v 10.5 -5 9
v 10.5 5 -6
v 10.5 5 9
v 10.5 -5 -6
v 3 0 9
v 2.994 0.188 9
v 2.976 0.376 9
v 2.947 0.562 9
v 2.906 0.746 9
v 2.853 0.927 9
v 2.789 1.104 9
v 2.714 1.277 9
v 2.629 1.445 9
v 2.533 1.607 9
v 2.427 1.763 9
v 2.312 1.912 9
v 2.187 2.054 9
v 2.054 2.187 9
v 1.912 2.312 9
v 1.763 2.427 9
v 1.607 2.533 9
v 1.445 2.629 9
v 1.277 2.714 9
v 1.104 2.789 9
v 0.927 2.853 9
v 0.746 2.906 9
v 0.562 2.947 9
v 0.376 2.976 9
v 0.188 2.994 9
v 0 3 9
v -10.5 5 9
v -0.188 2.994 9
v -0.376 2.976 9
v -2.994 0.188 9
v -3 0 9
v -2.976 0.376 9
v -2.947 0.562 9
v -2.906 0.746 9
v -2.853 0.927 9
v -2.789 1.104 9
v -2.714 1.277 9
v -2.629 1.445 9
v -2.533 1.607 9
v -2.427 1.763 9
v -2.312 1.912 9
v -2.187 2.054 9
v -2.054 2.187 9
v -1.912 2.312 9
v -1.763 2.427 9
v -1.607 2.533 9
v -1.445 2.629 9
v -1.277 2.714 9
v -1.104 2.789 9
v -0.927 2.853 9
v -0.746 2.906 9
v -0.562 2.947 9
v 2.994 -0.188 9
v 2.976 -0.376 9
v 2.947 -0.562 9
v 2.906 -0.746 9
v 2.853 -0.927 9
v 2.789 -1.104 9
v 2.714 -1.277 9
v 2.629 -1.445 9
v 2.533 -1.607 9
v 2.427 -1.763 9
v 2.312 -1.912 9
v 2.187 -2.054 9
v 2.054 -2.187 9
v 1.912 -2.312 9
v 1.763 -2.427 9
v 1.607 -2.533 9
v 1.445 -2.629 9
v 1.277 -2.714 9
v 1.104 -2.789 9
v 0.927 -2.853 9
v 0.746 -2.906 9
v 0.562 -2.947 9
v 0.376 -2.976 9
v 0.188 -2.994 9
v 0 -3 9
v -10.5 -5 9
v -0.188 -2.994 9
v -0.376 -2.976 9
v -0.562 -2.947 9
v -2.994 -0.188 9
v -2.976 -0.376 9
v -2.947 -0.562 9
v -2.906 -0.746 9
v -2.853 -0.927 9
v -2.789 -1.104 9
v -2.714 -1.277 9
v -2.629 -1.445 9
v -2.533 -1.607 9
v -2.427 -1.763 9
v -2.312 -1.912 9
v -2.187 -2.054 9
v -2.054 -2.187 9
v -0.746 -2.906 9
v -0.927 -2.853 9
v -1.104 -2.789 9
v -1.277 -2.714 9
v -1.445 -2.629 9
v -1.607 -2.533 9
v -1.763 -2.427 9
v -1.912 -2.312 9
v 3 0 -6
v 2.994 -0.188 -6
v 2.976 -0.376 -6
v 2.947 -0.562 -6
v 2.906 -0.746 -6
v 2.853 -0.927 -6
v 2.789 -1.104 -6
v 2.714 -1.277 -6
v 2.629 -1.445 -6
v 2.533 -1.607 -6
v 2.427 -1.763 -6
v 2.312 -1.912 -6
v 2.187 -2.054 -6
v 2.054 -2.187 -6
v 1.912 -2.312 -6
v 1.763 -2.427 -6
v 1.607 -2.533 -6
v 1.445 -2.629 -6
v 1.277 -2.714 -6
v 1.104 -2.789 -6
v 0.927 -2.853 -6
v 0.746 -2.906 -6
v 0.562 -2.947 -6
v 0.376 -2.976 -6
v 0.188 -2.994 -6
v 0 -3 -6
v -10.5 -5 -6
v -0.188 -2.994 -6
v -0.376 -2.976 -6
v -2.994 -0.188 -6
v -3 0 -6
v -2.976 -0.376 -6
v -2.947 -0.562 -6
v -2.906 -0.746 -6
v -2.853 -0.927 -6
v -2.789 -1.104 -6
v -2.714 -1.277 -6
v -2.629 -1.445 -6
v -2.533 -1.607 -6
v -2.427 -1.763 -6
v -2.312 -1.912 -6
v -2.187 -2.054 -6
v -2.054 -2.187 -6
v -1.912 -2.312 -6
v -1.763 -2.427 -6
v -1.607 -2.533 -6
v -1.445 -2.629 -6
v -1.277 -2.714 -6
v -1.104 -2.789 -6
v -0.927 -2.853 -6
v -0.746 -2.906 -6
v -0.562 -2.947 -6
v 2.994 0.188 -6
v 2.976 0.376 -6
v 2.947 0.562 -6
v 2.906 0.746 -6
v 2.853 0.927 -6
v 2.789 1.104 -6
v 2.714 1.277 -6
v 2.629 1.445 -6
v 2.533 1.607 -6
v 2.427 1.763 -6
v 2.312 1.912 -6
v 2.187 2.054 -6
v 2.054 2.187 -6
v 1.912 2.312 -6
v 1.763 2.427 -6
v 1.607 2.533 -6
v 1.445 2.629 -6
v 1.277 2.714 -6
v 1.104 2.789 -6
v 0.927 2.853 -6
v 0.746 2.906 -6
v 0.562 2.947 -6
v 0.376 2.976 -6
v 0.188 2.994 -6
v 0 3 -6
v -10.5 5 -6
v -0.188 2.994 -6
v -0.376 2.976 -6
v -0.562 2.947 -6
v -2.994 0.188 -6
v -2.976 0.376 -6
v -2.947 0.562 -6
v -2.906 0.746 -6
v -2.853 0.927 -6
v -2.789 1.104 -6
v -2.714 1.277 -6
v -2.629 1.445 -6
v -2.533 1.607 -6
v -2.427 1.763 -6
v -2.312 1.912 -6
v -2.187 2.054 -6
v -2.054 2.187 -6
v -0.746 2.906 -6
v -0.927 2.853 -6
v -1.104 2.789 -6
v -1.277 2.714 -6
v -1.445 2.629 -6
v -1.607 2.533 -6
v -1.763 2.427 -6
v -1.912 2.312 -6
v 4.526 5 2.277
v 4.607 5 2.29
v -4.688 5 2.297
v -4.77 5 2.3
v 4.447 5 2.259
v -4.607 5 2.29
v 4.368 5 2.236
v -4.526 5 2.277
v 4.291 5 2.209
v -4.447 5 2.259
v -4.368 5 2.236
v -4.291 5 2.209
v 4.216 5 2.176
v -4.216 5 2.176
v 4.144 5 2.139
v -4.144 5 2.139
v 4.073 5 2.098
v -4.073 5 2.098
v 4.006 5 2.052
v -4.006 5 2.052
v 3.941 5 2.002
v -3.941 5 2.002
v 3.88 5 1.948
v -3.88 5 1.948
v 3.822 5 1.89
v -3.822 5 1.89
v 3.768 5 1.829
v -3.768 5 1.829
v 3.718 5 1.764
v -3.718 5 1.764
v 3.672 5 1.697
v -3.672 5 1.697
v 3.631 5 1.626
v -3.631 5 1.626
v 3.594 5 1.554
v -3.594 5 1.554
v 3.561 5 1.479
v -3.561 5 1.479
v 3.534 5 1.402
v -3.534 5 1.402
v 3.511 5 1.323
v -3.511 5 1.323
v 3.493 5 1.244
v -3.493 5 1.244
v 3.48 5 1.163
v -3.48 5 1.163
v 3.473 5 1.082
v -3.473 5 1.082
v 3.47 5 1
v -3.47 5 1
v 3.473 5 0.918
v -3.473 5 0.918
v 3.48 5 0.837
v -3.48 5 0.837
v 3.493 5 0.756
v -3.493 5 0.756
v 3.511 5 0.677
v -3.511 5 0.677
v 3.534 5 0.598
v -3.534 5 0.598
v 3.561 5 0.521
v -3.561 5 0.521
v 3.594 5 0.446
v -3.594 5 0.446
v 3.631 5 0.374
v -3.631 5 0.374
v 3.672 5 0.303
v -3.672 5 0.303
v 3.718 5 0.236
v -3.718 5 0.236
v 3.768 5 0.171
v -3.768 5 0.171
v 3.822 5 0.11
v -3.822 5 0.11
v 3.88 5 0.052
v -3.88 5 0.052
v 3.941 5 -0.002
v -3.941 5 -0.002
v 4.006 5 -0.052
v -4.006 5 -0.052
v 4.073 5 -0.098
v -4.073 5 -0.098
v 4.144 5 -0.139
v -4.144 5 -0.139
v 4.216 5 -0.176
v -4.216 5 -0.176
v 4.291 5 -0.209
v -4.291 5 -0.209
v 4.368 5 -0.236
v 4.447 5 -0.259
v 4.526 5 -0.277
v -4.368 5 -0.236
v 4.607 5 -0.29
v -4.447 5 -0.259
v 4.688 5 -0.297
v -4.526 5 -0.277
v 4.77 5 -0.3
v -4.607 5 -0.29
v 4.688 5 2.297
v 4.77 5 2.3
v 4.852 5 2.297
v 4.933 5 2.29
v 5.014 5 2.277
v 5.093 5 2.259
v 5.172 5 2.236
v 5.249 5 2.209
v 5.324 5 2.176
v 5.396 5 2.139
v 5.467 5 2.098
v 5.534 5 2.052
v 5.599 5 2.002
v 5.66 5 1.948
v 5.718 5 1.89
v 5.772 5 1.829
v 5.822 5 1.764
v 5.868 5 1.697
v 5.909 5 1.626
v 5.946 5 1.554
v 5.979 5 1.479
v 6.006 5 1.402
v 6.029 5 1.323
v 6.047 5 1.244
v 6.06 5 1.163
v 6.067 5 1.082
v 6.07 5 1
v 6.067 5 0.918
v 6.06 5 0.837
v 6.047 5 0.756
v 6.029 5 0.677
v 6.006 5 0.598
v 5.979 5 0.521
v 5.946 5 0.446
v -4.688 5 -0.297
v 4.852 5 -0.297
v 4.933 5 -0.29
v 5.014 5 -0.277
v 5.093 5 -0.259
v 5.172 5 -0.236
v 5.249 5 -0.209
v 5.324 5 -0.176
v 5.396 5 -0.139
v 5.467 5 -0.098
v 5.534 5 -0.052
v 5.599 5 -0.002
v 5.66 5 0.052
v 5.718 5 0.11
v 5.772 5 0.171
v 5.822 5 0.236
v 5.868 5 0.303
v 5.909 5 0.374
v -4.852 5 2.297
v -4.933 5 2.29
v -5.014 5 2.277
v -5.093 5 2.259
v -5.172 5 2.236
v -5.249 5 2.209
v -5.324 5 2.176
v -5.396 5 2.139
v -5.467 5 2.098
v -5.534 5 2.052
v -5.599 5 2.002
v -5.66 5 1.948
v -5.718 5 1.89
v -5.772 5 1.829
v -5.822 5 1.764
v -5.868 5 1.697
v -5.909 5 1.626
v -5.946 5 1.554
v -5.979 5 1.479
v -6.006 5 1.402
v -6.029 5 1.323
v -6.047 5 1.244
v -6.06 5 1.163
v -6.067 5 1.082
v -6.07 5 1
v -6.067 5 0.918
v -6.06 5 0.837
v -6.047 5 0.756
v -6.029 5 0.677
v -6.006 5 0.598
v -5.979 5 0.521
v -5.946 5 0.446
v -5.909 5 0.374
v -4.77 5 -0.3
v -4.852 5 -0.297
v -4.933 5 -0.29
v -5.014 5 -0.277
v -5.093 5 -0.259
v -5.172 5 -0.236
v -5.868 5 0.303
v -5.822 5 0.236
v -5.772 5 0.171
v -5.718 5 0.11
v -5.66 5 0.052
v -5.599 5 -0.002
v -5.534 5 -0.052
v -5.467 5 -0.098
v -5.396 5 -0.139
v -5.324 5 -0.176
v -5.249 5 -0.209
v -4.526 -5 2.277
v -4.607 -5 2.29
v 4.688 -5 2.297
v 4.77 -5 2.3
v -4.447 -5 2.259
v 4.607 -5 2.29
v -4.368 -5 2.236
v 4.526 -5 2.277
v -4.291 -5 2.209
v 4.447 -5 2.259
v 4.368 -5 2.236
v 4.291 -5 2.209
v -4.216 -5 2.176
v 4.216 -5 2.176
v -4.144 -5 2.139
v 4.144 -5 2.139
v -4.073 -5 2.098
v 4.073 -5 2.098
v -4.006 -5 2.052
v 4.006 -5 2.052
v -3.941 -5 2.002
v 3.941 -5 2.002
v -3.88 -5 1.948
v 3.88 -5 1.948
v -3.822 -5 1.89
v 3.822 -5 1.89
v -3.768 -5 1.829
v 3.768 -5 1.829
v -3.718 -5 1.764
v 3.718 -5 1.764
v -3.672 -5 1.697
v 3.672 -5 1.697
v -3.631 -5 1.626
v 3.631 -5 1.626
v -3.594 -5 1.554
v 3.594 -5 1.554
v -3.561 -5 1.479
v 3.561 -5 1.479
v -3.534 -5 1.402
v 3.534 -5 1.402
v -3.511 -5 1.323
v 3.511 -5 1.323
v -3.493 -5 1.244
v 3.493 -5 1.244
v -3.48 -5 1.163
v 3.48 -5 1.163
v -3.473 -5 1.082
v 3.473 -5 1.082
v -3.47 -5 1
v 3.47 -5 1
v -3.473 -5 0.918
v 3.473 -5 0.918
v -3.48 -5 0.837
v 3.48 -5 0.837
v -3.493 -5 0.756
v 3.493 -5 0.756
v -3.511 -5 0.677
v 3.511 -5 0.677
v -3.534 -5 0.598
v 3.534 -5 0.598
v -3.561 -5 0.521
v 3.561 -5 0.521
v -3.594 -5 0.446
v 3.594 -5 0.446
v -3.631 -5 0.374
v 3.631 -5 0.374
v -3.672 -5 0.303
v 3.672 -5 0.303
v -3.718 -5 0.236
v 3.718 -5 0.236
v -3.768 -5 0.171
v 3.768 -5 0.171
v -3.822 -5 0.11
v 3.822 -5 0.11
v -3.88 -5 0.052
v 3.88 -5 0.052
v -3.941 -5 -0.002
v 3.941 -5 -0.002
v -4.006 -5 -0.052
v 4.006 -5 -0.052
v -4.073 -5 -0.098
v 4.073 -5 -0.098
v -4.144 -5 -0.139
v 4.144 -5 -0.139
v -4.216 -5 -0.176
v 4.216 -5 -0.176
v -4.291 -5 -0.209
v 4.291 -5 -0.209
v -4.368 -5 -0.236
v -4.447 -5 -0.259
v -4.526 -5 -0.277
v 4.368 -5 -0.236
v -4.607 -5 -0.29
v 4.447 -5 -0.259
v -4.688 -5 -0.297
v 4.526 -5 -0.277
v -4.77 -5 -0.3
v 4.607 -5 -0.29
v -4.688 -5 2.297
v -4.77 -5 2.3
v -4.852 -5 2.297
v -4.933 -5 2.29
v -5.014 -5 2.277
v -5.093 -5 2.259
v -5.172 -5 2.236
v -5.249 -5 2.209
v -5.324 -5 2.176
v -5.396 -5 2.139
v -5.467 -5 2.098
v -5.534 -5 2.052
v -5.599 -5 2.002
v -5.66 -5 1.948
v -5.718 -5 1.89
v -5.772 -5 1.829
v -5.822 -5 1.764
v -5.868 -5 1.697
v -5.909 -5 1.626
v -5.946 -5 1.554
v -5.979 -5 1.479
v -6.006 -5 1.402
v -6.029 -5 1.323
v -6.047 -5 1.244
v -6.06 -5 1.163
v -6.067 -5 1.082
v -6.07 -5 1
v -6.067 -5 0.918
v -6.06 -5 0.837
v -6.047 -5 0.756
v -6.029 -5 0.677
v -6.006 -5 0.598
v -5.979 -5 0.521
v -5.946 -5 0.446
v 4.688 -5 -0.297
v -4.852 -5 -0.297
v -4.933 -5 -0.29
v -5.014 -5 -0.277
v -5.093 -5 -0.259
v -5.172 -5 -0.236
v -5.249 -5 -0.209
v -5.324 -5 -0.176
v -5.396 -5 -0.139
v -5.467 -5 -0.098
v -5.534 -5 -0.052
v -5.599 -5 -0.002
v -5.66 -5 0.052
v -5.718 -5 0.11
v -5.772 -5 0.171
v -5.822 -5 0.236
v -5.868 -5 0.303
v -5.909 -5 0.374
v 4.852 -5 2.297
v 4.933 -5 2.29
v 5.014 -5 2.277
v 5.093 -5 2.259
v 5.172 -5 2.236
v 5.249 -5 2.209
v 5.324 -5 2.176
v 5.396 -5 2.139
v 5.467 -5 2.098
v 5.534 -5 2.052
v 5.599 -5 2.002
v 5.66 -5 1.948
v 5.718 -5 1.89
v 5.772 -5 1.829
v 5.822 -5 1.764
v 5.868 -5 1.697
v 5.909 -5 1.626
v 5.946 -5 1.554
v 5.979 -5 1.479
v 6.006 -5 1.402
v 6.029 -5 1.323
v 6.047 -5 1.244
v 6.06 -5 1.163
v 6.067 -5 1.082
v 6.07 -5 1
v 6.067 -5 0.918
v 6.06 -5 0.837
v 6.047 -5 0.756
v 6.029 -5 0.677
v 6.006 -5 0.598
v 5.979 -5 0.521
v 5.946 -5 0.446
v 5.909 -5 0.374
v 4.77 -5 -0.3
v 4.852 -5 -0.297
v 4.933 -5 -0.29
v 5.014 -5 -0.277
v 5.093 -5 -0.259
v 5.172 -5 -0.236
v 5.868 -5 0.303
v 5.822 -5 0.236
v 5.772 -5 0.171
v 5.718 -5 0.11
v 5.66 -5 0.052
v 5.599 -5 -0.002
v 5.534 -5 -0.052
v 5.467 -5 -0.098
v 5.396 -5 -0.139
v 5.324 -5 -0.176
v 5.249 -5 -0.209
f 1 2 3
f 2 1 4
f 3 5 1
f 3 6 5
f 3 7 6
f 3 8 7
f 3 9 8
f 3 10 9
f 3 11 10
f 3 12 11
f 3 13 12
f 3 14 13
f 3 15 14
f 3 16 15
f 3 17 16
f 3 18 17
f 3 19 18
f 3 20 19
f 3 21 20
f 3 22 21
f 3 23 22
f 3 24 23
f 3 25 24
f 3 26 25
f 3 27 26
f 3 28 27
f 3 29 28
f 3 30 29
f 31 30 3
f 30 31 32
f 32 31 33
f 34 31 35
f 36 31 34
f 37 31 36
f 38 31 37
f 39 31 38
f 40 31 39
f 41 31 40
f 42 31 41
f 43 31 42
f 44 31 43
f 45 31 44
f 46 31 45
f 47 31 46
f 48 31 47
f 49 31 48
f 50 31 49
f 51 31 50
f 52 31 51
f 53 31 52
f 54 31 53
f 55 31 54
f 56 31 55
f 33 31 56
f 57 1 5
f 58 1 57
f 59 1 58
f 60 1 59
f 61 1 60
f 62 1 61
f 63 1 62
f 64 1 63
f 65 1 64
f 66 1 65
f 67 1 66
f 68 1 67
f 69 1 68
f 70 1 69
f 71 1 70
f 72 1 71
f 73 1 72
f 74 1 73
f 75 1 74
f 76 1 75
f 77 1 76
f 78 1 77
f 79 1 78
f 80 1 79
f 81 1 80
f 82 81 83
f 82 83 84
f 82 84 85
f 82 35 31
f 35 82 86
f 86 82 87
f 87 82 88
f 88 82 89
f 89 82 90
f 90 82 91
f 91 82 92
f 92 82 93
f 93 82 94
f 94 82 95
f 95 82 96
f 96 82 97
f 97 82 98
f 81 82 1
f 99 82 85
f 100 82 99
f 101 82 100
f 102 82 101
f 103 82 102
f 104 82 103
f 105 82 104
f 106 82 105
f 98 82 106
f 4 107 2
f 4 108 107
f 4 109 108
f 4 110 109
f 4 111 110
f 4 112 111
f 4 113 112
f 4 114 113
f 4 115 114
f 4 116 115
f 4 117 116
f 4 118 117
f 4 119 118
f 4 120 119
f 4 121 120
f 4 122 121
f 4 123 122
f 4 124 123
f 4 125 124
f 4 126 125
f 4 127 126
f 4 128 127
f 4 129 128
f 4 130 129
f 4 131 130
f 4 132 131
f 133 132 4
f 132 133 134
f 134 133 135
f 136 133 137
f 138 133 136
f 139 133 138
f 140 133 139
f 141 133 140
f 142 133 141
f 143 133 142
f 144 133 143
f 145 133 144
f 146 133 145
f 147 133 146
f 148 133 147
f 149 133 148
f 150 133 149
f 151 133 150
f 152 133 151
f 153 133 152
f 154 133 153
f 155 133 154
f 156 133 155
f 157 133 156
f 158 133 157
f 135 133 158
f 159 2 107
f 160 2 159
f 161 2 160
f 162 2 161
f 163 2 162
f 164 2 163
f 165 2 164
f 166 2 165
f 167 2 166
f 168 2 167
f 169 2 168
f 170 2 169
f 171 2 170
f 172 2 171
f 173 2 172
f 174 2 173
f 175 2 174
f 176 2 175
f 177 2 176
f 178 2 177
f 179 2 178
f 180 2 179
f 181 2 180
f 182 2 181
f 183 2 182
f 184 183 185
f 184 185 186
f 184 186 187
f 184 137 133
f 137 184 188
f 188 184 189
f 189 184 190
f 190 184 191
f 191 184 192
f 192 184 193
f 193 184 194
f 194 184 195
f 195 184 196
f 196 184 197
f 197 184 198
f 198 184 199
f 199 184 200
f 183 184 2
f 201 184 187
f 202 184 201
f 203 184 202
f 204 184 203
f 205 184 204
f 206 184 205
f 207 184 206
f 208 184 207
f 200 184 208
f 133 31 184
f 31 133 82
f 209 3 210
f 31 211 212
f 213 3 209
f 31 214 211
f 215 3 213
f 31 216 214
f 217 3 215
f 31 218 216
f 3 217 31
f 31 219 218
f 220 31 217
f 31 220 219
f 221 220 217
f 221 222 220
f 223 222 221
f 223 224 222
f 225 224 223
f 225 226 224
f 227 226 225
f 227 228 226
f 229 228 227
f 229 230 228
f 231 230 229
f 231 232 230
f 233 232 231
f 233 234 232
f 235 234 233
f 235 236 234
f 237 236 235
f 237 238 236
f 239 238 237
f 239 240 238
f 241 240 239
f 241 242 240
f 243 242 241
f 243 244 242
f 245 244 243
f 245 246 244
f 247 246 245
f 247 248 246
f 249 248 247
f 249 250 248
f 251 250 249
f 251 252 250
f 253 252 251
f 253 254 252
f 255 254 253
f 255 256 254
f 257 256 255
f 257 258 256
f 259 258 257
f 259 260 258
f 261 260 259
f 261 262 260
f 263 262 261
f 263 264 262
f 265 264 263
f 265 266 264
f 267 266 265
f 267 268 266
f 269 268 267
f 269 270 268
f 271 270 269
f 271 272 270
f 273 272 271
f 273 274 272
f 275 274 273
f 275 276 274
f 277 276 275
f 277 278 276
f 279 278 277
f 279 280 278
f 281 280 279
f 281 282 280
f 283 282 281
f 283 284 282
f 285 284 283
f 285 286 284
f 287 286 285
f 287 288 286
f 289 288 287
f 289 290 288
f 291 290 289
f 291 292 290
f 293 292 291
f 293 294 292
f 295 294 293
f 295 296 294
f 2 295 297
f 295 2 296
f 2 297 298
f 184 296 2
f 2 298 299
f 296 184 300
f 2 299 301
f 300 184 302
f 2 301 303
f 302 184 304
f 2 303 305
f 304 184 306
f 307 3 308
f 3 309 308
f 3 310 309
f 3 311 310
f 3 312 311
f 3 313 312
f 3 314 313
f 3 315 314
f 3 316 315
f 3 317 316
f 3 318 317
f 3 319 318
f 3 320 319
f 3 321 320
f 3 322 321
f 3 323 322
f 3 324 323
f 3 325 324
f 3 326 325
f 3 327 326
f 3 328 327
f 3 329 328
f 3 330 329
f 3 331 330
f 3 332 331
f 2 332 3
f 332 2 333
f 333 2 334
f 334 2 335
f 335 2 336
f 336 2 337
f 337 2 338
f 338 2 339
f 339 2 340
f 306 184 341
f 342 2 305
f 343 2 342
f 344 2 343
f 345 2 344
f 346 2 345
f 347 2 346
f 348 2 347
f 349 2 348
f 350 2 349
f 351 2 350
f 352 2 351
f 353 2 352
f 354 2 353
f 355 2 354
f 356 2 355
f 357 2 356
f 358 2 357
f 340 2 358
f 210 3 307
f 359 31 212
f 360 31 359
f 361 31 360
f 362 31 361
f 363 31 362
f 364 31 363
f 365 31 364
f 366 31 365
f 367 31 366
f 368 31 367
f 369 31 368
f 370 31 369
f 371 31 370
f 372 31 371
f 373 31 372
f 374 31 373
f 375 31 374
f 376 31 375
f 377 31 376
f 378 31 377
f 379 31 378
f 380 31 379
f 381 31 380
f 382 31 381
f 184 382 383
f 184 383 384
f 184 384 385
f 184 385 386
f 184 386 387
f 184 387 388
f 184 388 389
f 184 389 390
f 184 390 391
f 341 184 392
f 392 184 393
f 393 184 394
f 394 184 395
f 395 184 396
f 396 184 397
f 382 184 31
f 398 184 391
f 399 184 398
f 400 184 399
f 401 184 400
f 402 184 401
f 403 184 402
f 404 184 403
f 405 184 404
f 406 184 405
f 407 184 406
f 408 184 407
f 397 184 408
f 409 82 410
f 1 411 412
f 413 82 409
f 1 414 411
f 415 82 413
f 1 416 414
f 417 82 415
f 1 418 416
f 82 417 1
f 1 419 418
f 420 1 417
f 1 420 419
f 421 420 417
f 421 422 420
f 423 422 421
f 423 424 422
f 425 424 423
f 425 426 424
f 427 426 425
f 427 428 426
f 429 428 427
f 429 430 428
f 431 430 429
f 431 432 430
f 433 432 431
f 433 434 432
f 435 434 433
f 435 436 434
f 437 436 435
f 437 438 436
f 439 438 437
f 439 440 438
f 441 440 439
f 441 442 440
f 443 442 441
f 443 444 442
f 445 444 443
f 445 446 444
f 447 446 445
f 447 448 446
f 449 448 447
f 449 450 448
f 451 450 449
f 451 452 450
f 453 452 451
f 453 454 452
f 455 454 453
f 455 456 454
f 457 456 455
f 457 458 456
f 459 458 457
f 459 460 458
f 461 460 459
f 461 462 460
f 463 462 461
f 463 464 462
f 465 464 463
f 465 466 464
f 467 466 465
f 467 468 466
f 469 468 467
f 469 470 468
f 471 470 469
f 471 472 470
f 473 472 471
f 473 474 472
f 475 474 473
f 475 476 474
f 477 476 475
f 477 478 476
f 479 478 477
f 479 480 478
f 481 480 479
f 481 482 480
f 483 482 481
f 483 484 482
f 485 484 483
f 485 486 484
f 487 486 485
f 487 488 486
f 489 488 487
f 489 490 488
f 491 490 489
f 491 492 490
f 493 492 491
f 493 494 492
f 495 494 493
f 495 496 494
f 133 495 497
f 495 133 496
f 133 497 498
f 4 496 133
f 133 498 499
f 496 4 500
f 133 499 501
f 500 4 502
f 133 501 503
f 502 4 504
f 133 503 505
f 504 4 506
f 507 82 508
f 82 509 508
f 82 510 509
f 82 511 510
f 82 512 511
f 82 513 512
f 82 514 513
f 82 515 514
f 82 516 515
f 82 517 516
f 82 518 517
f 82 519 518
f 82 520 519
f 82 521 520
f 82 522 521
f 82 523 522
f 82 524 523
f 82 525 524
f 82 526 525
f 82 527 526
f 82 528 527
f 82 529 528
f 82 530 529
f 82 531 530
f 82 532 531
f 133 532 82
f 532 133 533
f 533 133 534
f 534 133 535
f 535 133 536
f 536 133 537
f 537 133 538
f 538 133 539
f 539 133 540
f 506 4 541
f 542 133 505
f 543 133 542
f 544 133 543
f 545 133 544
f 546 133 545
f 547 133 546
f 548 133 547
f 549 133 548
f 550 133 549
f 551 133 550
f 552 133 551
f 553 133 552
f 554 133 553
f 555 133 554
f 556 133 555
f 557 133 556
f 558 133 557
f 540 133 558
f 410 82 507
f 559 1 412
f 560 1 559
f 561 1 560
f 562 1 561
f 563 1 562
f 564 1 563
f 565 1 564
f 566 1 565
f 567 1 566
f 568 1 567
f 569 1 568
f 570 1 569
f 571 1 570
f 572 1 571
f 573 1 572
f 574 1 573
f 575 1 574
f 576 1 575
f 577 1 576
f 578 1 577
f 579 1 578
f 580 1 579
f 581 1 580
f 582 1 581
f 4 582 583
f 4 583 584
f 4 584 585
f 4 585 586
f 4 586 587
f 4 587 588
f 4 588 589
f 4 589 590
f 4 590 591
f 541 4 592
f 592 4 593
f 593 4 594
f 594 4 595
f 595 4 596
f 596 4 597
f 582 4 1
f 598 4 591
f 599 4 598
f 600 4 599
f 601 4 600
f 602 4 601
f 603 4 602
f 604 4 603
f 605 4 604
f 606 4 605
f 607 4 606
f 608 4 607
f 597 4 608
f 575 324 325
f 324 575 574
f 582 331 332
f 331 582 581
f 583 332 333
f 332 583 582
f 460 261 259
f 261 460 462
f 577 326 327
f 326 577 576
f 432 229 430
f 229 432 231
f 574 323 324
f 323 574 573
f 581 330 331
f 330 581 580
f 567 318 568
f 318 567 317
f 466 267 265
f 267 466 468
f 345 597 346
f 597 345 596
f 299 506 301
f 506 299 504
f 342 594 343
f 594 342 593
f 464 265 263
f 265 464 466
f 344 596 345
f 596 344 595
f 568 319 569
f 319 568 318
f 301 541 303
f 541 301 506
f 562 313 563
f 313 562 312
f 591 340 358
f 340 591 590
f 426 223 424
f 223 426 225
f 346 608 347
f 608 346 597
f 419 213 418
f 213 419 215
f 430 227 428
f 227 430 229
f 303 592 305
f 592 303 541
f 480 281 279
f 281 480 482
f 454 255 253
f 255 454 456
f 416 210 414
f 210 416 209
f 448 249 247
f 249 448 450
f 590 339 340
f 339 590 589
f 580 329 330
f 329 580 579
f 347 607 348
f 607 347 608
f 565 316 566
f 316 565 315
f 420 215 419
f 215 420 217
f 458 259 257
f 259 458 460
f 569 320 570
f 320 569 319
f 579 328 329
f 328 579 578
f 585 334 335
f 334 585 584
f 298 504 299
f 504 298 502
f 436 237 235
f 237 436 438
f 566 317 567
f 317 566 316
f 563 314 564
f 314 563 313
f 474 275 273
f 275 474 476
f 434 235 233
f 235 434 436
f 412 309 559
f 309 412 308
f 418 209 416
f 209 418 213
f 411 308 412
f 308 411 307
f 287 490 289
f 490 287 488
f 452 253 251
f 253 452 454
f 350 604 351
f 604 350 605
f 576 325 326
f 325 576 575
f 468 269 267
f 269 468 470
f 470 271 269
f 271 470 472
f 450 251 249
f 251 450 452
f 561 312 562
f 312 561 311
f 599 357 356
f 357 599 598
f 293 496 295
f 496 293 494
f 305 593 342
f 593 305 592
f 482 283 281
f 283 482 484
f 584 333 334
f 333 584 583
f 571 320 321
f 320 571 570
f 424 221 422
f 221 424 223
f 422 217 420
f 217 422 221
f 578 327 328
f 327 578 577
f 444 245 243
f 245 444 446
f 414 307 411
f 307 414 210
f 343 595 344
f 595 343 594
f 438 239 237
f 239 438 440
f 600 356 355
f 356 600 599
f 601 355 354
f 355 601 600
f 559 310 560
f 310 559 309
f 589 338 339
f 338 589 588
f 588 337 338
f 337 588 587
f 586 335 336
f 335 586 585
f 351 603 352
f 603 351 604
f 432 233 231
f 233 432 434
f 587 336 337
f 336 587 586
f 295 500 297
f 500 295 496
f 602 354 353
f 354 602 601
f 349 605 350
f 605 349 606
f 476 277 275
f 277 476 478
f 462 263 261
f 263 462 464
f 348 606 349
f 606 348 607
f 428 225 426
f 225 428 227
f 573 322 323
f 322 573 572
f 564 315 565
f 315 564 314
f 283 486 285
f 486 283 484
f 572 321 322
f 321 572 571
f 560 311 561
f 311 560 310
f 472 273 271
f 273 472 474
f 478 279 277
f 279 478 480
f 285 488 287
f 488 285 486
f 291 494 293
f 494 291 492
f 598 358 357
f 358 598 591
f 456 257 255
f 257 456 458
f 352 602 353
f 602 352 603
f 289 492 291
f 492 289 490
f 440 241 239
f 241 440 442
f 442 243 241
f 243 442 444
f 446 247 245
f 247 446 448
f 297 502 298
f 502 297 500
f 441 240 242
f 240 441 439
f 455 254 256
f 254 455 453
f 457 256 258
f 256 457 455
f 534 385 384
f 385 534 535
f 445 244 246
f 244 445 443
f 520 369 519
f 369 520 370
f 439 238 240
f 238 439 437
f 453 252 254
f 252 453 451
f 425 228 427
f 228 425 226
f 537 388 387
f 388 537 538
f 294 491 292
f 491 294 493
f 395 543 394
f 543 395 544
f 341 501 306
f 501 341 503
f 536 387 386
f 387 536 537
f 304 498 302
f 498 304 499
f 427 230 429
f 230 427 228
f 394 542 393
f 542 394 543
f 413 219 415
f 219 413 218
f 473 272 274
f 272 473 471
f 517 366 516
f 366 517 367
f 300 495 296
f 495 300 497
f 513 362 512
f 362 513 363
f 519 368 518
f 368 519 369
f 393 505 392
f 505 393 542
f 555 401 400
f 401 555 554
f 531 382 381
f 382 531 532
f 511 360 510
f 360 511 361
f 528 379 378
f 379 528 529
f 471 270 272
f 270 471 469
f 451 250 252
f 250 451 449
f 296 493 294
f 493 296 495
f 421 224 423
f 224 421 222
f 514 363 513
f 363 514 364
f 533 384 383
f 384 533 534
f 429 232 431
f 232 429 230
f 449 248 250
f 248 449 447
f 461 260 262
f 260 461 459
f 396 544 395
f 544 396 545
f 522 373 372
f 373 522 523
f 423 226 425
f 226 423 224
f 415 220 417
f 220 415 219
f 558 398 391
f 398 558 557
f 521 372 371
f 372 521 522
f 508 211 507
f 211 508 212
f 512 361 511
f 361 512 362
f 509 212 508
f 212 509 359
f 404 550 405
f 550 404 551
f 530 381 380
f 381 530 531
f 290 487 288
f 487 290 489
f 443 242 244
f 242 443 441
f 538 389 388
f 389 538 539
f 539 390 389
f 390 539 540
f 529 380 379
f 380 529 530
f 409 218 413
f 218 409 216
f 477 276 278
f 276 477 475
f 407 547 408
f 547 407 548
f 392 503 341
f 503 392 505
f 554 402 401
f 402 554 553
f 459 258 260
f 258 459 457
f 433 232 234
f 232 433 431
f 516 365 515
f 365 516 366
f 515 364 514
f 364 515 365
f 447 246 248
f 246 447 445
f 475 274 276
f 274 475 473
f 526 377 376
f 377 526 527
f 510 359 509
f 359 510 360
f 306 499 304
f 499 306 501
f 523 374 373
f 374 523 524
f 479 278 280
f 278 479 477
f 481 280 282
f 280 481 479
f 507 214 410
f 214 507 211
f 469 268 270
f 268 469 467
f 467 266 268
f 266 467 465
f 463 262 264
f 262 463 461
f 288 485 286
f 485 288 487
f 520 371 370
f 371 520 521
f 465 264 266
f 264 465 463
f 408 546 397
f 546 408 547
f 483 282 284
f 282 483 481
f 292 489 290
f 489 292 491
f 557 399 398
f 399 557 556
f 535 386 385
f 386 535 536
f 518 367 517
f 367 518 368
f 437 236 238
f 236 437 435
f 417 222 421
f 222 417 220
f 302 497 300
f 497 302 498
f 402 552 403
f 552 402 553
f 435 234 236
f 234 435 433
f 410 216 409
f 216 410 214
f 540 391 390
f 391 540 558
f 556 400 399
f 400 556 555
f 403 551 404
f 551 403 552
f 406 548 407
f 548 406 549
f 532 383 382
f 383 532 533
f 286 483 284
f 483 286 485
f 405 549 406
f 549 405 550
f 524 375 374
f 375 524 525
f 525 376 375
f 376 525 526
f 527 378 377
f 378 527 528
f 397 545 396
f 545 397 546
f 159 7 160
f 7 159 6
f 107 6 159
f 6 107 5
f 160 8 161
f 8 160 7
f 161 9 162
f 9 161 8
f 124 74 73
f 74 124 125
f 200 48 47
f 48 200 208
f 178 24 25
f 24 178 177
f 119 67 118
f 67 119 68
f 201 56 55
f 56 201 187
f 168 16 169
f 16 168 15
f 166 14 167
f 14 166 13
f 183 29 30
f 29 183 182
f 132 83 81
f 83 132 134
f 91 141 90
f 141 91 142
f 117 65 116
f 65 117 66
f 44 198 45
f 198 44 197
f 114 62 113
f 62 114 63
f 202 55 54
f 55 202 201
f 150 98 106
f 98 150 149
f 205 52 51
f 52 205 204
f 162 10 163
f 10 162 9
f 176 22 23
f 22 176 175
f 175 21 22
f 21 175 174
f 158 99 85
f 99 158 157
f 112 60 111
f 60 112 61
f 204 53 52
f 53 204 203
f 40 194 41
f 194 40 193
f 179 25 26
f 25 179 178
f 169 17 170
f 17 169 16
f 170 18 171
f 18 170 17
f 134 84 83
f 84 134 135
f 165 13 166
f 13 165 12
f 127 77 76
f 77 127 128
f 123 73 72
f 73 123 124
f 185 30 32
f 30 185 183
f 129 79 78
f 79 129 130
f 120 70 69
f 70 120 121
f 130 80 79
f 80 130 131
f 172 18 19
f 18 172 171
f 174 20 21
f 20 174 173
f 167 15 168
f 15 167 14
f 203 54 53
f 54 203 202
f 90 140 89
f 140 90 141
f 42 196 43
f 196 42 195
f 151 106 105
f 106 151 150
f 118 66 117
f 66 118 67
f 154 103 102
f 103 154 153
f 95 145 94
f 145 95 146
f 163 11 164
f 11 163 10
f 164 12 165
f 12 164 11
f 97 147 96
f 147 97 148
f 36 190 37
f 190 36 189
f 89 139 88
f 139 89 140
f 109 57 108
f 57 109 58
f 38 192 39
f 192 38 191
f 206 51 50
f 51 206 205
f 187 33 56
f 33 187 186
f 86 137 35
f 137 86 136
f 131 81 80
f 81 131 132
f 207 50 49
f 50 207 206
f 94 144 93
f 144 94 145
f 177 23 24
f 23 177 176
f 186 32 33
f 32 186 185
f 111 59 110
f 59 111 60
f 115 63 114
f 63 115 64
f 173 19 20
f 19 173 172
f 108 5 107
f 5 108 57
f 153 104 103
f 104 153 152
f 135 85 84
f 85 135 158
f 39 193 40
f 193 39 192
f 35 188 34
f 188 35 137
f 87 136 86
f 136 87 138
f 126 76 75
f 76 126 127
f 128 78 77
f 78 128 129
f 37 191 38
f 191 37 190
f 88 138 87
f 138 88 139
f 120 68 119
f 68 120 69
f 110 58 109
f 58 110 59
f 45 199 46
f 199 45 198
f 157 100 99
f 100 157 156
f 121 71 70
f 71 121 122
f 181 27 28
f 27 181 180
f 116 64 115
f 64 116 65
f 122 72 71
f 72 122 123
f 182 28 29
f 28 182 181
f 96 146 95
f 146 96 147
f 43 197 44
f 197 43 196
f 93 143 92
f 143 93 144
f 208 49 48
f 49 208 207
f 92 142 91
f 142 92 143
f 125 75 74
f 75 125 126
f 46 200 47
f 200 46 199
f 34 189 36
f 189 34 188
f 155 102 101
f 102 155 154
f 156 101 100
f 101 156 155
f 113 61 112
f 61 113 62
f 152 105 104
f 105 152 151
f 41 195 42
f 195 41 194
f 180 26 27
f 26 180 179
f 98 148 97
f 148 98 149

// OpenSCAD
$fn=100;
module screw(){
cylinder(r=1.9,h=30,center=true);
translate([0,0,7])
cylinder(r2=4,r1=1.9,h=2.1);
}

module switch(){
difference(){
translate([0,0,1.5])
cube([21,10,15],center=true);
translate([3.5+1.27,0,1])
rotate([90,0,0])
cylinder(r=1.3,h=12,center=true);
translate([-3.5-1.27,0,1])
rotate([90,0,0])
cylinder(r=1.3,h=12,center=true);
cylinder(r=3,h=25,center=true);
}}

module base(){
difference(){
cube([23,10.2,3],center=true);
translate([-7,0,-7])
screw();
translate([7,0,-7])
screw();
}
translate([0,6.6,5-1.5])
cube([23,3,10],center=true);
cylinder(r=2.6,h=12);
}

switch();
//base();
